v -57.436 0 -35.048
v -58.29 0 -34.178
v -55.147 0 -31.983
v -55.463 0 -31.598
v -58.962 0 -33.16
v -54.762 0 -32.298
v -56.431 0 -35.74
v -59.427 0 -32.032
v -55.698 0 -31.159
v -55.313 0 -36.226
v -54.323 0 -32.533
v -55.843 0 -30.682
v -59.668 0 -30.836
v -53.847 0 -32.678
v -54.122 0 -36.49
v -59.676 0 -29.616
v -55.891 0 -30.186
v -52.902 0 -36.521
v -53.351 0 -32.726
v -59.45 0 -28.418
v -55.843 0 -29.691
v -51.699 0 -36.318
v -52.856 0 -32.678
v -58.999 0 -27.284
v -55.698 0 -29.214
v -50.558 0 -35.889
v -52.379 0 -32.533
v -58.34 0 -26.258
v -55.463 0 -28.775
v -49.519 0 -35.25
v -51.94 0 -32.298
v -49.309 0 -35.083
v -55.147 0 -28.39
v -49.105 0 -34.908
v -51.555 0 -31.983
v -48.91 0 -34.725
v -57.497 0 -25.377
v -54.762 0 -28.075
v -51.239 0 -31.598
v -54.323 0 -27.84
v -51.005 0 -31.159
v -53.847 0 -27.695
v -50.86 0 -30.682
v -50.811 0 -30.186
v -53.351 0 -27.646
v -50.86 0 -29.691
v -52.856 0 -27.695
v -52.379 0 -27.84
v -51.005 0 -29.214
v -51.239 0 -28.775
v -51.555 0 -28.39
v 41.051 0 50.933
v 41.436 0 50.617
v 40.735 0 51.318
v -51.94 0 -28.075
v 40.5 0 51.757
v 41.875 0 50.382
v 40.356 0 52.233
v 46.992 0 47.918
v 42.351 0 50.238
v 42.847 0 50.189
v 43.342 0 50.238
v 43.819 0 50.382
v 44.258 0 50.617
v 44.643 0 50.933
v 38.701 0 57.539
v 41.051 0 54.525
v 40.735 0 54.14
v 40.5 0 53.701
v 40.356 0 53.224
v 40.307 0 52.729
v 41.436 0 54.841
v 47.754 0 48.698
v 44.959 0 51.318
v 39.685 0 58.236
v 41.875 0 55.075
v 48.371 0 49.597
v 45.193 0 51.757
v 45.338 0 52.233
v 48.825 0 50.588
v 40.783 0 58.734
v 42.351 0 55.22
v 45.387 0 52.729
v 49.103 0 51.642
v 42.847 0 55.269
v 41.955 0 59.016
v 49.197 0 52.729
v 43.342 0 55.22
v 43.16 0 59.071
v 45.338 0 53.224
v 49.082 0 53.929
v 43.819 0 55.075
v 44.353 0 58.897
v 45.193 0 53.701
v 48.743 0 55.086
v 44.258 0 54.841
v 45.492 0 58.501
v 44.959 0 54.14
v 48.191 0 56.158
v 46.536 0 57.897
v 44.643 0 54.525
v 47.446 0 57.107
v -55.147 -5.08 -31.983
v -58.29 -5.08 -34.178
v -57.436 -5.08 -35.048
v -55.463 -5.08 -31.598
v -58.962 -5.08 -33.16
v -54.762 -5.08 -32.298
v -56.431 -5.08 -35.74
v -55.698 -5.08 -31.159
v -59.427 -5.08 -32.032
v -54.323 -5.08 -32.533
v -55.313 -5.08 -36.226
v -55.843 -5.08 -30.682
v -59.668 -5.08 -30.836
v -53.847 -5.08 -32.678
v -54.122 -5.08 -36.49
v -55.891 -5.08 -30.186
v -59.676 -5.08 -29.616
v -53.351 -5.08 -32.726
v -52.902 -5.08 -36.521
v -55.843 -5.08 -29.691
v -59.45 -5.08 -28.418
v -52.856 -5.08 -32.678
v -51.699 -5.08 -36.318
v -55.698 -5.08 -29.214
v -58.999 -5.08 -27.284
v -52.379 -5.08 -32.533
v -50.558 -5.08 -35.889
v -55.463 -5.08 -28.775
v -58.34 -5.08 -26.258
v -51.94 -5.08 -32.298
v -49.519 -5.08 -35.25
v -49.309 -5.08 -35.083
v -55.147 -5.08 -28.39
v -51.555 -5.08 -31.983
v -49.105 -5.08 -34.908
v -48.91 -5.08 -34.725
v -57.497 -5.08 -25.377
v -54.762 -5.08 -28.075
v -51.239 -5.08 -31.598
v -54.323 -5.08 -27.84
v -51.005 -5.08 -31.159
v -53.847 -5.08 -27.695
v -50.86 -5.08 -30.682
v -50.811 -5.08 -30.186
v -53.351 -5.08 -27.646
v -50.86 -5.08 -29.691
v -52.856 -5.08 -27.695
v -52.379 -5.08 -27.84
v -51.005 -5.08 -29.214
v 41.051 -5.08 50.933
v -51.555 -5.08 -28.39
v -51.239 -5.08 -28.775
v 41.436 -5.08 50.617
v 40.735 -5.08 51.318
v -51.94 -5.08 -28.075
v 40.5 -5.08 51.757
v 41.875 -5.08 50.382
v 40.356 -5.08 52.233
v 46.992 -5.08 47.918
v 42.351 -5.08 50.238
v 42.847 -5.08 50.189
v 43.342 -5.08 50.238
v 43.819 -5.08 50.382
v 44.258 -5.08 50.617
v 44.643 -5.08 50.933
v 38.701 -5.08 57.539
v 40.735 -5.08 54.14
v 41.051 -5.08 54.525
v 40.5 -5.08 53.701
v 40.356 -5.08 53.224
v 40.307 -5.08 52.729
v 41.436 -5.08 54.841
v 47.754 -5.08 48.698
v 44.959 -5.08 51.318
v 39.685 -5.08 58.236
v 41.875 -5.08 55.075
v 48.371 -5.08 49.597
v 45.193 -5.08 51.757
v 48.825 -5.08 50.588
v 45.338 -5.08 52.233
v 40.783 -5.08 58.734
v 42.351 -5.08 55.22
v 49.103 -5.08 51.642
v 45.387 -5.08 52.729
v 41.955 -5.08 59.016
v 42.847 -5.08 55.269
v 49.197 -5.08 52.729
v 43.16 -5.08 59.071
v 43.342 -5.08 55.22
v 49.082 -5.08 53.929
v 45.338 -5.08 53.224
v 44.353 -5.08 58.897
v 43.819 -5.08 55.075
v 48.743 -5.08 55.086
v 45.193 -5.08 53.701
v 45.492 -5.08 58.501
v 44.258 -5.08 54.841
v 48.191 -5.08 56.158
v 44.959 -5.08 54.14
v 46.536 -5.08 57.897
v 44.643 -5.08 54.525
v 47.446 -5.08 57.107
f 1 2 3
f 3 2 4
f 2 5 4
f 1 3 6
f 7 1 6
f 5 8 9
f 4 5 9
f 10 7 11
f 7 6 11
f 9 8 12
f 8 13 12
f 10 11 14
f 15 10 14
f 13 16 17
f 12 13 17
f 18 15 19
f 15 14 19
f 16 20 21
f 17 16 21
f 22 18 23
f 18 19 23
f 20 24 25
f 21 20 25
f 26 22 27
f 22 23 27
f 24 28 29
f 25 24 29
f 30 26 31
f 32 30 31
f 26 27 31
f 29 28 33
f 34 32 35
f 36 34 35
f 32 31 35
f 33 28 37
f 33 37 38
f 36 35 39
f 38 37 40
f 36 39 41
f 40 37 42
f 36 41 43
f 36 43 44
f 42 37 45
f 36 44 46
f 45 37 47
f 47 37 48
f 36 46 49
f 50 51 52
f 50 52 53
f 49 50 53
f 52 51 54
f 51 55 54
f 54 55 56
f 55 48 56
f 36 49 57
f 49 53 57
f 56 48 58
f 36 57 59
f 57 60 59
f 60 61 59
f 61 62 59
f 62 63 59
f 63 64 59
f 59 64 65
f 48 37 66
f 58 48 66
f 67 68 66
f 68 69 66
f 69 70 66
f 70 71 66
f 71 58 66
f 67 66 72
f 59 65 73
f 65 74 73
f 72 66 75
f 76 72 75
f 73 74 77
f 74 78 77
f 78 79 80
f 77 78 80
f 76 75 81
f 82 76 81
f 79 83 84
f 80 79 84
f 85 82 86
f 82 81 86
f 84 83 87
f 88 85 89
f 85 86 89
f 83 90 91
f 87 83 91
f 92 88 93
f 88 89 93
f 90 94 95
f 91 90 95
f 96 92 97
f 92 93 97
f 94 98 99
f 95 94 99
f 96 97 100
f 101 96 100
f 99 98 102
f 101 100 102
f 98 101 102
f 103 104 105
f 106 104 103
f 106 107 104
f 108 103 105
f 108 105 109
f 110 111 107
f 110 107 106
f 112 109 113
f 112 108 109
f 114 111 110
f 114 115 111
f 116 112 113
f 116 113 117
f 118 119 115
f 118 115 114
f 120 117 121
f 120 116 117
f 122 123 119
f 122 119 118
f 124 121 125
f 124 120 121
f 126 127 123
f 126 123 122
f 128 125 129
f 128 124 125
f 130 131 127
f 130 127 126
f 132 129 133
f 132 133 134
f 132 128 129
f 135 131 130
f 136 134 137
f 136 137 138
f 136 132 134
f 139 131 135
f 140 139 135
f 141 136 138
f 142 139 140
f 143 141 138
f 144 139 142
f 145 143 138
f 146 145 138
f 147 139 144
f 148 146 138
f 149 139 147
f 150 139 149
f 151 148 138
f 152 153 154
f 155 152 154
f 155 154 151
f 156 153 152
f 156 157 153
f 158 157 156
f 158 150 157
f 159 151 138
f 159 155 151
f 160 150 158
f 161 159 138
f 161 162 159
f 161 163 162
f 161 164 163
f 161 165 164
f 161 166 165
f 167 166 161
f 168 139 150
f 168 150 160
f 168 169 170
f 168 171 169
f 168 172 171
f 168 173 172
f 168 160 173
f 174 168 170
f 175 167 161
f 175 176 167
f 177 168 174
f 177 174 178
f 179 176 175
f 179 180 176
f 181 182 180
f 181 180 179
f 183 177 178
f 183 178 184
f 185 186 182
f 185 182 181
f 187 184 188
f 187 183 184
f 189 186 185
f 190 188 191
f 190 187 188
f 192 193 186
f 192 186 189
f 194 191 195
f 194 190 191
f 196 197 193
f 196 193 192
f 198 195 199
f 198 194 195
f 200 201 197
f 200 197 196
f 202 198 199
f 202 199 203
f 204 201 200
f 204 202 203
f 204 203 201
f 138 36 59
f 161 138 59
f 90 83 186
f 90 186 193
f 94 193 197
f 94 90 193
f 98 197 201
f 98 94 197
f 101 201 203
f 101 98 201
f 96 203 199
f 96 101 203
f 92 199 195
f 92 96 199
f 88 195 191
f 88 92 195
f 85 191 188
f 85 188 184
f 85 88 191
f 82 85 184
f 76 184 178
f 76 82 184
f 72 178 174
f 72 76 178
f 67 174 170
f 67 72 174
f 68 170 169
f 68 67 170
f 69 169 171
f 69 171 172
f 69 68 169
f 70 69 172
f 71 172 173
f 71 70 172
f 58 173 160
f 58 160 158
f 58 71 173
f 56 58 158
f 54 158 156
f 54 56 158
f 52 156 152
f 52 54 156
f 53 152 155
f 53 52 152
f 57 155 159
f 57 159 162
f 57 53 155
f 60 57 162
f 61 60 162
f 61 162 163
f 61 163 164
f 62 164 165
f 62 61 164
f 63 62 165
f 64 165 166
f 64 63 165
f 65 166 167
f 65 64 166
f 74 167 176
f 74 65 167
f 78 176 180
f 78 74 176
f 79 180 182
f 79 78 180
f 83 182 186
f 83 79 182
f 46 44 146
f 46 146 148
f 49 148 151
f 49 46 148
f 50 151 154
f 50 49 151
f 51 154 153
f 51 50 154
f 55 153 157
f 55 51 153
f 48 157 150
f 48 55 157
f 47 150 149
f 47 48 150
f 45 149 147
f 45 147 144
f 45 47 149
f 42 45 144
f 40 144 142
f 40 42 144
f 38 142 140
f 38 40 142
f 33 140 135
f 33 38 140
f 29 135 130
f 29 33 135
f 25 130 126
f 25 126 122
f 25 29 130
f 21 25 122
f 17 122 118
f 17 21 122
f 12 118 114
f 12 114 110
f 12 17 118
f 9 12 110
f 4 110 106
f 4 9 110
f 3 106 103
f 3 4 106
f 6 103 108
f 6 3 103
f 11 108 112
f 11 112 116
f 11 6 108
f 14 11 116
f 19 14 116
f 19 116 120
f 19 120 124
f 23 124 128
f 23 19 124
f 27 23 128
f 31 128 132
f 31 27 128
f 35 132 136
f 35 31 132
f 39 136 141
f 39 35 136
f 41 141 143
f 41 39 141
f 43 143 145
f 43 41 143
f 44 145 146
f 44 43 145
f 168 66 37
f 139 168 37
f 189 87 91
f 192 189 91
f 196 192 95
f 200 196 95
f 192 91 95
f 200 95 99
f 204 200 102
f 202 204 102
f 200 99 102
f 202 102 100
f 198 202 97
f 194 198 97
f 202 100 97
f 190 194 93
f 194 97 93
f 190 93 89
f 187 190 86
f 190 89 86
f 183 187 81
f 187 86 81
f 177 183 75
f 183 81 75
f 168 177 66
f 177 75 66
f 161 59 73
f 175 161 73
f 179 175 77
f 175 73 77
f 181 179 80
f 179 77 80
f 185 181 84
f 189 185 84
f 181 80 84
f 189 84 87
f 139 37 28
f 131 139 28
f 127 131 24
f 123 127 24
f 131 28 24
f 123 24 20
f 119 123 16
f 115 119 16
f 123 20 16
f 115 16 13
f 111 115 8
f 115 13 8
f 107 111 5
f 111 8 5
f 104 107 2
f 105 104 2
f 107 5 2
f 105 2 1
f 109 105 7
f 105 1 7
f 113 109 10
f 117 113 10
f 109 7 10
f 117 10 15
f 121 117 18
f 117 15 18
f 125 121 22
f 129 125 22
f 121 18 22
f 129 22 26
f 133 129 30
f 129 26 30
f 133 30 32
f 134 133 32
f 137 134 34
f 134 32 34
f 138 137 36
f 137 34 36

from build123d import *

# Parameters (mm, degrees)
F0_R     = 2.54
F1_DEPTH = 5.08


with BuildPart() as f1:
    # F0 (on Front) → F1 (new body)
    with BuildSketch(Plane.XZ):
        with BuildLine():
            ThreePointArc((-48.909848, -34.724761), (-47.497862, -32.648118), (-47.001315, -30.186494))
            ThreePointArc((-47.001315, -30.186494), (-50.705854, -24.413797), (-57.497075, -25.37659))
            ThreePointArc((-57.497075, -25.37659), (-58.29029, -34.177612), (-49.518854, -35.249571))
            Line((-49.518854, -35.249571), (-48.909848, -34.724761))
        make_face()
        with Locations((-53.351315, -30.186494)):
            Circle(F0_R, mode=Mode.SUBTRACT)
        with BuildLine():
            ThreePointArc((-57.497075, -25.37659), (-50.705854, -24.413797), (-47.001315, -30.186494))
            ThreePointArc((-47.001315, -30.186494), (-47.497862, -32.648118), (-48.909848, -34.724761))
            Line((-48.909848, -34.724761), (46.992039, 47.918384))
            ThreePointArc((46.992039, 47.918384), (38.03665, 48.583185), (38.701002, 57.538608))
            Line((38.701002, 57.538608), (-57.497075, -25.37659))
        make_face()
        with BuildLine():
            ThreePointArc((-49.518854, -35.249571), (-49.206037, -34.996814), (-48.909848, -34.724761))
            Line((-48.909848, -34.724761), (-49.518854, -35.249571))
        make_face()
        with BuildLine():
            ThreePointArc((49.196762, 52.728704), (45.492222, 58.501402), (38.701002, 57.538608))
            ThreePointArc((38.701002, 57.538608), (38.03665, 48.583185), (46.992039, 47.918384))
            ThreePointArc((46.992039, 47.918384), (48.619327, 50.082954), (49.196762, 52.728704))
        make_face()
        with Locations((42.846762, 52.728704)):
            Circle(F0_R, mode=Mode.SUBTRACT)
    extrude(amount=F1_DEPTH)


solid = f1.part
